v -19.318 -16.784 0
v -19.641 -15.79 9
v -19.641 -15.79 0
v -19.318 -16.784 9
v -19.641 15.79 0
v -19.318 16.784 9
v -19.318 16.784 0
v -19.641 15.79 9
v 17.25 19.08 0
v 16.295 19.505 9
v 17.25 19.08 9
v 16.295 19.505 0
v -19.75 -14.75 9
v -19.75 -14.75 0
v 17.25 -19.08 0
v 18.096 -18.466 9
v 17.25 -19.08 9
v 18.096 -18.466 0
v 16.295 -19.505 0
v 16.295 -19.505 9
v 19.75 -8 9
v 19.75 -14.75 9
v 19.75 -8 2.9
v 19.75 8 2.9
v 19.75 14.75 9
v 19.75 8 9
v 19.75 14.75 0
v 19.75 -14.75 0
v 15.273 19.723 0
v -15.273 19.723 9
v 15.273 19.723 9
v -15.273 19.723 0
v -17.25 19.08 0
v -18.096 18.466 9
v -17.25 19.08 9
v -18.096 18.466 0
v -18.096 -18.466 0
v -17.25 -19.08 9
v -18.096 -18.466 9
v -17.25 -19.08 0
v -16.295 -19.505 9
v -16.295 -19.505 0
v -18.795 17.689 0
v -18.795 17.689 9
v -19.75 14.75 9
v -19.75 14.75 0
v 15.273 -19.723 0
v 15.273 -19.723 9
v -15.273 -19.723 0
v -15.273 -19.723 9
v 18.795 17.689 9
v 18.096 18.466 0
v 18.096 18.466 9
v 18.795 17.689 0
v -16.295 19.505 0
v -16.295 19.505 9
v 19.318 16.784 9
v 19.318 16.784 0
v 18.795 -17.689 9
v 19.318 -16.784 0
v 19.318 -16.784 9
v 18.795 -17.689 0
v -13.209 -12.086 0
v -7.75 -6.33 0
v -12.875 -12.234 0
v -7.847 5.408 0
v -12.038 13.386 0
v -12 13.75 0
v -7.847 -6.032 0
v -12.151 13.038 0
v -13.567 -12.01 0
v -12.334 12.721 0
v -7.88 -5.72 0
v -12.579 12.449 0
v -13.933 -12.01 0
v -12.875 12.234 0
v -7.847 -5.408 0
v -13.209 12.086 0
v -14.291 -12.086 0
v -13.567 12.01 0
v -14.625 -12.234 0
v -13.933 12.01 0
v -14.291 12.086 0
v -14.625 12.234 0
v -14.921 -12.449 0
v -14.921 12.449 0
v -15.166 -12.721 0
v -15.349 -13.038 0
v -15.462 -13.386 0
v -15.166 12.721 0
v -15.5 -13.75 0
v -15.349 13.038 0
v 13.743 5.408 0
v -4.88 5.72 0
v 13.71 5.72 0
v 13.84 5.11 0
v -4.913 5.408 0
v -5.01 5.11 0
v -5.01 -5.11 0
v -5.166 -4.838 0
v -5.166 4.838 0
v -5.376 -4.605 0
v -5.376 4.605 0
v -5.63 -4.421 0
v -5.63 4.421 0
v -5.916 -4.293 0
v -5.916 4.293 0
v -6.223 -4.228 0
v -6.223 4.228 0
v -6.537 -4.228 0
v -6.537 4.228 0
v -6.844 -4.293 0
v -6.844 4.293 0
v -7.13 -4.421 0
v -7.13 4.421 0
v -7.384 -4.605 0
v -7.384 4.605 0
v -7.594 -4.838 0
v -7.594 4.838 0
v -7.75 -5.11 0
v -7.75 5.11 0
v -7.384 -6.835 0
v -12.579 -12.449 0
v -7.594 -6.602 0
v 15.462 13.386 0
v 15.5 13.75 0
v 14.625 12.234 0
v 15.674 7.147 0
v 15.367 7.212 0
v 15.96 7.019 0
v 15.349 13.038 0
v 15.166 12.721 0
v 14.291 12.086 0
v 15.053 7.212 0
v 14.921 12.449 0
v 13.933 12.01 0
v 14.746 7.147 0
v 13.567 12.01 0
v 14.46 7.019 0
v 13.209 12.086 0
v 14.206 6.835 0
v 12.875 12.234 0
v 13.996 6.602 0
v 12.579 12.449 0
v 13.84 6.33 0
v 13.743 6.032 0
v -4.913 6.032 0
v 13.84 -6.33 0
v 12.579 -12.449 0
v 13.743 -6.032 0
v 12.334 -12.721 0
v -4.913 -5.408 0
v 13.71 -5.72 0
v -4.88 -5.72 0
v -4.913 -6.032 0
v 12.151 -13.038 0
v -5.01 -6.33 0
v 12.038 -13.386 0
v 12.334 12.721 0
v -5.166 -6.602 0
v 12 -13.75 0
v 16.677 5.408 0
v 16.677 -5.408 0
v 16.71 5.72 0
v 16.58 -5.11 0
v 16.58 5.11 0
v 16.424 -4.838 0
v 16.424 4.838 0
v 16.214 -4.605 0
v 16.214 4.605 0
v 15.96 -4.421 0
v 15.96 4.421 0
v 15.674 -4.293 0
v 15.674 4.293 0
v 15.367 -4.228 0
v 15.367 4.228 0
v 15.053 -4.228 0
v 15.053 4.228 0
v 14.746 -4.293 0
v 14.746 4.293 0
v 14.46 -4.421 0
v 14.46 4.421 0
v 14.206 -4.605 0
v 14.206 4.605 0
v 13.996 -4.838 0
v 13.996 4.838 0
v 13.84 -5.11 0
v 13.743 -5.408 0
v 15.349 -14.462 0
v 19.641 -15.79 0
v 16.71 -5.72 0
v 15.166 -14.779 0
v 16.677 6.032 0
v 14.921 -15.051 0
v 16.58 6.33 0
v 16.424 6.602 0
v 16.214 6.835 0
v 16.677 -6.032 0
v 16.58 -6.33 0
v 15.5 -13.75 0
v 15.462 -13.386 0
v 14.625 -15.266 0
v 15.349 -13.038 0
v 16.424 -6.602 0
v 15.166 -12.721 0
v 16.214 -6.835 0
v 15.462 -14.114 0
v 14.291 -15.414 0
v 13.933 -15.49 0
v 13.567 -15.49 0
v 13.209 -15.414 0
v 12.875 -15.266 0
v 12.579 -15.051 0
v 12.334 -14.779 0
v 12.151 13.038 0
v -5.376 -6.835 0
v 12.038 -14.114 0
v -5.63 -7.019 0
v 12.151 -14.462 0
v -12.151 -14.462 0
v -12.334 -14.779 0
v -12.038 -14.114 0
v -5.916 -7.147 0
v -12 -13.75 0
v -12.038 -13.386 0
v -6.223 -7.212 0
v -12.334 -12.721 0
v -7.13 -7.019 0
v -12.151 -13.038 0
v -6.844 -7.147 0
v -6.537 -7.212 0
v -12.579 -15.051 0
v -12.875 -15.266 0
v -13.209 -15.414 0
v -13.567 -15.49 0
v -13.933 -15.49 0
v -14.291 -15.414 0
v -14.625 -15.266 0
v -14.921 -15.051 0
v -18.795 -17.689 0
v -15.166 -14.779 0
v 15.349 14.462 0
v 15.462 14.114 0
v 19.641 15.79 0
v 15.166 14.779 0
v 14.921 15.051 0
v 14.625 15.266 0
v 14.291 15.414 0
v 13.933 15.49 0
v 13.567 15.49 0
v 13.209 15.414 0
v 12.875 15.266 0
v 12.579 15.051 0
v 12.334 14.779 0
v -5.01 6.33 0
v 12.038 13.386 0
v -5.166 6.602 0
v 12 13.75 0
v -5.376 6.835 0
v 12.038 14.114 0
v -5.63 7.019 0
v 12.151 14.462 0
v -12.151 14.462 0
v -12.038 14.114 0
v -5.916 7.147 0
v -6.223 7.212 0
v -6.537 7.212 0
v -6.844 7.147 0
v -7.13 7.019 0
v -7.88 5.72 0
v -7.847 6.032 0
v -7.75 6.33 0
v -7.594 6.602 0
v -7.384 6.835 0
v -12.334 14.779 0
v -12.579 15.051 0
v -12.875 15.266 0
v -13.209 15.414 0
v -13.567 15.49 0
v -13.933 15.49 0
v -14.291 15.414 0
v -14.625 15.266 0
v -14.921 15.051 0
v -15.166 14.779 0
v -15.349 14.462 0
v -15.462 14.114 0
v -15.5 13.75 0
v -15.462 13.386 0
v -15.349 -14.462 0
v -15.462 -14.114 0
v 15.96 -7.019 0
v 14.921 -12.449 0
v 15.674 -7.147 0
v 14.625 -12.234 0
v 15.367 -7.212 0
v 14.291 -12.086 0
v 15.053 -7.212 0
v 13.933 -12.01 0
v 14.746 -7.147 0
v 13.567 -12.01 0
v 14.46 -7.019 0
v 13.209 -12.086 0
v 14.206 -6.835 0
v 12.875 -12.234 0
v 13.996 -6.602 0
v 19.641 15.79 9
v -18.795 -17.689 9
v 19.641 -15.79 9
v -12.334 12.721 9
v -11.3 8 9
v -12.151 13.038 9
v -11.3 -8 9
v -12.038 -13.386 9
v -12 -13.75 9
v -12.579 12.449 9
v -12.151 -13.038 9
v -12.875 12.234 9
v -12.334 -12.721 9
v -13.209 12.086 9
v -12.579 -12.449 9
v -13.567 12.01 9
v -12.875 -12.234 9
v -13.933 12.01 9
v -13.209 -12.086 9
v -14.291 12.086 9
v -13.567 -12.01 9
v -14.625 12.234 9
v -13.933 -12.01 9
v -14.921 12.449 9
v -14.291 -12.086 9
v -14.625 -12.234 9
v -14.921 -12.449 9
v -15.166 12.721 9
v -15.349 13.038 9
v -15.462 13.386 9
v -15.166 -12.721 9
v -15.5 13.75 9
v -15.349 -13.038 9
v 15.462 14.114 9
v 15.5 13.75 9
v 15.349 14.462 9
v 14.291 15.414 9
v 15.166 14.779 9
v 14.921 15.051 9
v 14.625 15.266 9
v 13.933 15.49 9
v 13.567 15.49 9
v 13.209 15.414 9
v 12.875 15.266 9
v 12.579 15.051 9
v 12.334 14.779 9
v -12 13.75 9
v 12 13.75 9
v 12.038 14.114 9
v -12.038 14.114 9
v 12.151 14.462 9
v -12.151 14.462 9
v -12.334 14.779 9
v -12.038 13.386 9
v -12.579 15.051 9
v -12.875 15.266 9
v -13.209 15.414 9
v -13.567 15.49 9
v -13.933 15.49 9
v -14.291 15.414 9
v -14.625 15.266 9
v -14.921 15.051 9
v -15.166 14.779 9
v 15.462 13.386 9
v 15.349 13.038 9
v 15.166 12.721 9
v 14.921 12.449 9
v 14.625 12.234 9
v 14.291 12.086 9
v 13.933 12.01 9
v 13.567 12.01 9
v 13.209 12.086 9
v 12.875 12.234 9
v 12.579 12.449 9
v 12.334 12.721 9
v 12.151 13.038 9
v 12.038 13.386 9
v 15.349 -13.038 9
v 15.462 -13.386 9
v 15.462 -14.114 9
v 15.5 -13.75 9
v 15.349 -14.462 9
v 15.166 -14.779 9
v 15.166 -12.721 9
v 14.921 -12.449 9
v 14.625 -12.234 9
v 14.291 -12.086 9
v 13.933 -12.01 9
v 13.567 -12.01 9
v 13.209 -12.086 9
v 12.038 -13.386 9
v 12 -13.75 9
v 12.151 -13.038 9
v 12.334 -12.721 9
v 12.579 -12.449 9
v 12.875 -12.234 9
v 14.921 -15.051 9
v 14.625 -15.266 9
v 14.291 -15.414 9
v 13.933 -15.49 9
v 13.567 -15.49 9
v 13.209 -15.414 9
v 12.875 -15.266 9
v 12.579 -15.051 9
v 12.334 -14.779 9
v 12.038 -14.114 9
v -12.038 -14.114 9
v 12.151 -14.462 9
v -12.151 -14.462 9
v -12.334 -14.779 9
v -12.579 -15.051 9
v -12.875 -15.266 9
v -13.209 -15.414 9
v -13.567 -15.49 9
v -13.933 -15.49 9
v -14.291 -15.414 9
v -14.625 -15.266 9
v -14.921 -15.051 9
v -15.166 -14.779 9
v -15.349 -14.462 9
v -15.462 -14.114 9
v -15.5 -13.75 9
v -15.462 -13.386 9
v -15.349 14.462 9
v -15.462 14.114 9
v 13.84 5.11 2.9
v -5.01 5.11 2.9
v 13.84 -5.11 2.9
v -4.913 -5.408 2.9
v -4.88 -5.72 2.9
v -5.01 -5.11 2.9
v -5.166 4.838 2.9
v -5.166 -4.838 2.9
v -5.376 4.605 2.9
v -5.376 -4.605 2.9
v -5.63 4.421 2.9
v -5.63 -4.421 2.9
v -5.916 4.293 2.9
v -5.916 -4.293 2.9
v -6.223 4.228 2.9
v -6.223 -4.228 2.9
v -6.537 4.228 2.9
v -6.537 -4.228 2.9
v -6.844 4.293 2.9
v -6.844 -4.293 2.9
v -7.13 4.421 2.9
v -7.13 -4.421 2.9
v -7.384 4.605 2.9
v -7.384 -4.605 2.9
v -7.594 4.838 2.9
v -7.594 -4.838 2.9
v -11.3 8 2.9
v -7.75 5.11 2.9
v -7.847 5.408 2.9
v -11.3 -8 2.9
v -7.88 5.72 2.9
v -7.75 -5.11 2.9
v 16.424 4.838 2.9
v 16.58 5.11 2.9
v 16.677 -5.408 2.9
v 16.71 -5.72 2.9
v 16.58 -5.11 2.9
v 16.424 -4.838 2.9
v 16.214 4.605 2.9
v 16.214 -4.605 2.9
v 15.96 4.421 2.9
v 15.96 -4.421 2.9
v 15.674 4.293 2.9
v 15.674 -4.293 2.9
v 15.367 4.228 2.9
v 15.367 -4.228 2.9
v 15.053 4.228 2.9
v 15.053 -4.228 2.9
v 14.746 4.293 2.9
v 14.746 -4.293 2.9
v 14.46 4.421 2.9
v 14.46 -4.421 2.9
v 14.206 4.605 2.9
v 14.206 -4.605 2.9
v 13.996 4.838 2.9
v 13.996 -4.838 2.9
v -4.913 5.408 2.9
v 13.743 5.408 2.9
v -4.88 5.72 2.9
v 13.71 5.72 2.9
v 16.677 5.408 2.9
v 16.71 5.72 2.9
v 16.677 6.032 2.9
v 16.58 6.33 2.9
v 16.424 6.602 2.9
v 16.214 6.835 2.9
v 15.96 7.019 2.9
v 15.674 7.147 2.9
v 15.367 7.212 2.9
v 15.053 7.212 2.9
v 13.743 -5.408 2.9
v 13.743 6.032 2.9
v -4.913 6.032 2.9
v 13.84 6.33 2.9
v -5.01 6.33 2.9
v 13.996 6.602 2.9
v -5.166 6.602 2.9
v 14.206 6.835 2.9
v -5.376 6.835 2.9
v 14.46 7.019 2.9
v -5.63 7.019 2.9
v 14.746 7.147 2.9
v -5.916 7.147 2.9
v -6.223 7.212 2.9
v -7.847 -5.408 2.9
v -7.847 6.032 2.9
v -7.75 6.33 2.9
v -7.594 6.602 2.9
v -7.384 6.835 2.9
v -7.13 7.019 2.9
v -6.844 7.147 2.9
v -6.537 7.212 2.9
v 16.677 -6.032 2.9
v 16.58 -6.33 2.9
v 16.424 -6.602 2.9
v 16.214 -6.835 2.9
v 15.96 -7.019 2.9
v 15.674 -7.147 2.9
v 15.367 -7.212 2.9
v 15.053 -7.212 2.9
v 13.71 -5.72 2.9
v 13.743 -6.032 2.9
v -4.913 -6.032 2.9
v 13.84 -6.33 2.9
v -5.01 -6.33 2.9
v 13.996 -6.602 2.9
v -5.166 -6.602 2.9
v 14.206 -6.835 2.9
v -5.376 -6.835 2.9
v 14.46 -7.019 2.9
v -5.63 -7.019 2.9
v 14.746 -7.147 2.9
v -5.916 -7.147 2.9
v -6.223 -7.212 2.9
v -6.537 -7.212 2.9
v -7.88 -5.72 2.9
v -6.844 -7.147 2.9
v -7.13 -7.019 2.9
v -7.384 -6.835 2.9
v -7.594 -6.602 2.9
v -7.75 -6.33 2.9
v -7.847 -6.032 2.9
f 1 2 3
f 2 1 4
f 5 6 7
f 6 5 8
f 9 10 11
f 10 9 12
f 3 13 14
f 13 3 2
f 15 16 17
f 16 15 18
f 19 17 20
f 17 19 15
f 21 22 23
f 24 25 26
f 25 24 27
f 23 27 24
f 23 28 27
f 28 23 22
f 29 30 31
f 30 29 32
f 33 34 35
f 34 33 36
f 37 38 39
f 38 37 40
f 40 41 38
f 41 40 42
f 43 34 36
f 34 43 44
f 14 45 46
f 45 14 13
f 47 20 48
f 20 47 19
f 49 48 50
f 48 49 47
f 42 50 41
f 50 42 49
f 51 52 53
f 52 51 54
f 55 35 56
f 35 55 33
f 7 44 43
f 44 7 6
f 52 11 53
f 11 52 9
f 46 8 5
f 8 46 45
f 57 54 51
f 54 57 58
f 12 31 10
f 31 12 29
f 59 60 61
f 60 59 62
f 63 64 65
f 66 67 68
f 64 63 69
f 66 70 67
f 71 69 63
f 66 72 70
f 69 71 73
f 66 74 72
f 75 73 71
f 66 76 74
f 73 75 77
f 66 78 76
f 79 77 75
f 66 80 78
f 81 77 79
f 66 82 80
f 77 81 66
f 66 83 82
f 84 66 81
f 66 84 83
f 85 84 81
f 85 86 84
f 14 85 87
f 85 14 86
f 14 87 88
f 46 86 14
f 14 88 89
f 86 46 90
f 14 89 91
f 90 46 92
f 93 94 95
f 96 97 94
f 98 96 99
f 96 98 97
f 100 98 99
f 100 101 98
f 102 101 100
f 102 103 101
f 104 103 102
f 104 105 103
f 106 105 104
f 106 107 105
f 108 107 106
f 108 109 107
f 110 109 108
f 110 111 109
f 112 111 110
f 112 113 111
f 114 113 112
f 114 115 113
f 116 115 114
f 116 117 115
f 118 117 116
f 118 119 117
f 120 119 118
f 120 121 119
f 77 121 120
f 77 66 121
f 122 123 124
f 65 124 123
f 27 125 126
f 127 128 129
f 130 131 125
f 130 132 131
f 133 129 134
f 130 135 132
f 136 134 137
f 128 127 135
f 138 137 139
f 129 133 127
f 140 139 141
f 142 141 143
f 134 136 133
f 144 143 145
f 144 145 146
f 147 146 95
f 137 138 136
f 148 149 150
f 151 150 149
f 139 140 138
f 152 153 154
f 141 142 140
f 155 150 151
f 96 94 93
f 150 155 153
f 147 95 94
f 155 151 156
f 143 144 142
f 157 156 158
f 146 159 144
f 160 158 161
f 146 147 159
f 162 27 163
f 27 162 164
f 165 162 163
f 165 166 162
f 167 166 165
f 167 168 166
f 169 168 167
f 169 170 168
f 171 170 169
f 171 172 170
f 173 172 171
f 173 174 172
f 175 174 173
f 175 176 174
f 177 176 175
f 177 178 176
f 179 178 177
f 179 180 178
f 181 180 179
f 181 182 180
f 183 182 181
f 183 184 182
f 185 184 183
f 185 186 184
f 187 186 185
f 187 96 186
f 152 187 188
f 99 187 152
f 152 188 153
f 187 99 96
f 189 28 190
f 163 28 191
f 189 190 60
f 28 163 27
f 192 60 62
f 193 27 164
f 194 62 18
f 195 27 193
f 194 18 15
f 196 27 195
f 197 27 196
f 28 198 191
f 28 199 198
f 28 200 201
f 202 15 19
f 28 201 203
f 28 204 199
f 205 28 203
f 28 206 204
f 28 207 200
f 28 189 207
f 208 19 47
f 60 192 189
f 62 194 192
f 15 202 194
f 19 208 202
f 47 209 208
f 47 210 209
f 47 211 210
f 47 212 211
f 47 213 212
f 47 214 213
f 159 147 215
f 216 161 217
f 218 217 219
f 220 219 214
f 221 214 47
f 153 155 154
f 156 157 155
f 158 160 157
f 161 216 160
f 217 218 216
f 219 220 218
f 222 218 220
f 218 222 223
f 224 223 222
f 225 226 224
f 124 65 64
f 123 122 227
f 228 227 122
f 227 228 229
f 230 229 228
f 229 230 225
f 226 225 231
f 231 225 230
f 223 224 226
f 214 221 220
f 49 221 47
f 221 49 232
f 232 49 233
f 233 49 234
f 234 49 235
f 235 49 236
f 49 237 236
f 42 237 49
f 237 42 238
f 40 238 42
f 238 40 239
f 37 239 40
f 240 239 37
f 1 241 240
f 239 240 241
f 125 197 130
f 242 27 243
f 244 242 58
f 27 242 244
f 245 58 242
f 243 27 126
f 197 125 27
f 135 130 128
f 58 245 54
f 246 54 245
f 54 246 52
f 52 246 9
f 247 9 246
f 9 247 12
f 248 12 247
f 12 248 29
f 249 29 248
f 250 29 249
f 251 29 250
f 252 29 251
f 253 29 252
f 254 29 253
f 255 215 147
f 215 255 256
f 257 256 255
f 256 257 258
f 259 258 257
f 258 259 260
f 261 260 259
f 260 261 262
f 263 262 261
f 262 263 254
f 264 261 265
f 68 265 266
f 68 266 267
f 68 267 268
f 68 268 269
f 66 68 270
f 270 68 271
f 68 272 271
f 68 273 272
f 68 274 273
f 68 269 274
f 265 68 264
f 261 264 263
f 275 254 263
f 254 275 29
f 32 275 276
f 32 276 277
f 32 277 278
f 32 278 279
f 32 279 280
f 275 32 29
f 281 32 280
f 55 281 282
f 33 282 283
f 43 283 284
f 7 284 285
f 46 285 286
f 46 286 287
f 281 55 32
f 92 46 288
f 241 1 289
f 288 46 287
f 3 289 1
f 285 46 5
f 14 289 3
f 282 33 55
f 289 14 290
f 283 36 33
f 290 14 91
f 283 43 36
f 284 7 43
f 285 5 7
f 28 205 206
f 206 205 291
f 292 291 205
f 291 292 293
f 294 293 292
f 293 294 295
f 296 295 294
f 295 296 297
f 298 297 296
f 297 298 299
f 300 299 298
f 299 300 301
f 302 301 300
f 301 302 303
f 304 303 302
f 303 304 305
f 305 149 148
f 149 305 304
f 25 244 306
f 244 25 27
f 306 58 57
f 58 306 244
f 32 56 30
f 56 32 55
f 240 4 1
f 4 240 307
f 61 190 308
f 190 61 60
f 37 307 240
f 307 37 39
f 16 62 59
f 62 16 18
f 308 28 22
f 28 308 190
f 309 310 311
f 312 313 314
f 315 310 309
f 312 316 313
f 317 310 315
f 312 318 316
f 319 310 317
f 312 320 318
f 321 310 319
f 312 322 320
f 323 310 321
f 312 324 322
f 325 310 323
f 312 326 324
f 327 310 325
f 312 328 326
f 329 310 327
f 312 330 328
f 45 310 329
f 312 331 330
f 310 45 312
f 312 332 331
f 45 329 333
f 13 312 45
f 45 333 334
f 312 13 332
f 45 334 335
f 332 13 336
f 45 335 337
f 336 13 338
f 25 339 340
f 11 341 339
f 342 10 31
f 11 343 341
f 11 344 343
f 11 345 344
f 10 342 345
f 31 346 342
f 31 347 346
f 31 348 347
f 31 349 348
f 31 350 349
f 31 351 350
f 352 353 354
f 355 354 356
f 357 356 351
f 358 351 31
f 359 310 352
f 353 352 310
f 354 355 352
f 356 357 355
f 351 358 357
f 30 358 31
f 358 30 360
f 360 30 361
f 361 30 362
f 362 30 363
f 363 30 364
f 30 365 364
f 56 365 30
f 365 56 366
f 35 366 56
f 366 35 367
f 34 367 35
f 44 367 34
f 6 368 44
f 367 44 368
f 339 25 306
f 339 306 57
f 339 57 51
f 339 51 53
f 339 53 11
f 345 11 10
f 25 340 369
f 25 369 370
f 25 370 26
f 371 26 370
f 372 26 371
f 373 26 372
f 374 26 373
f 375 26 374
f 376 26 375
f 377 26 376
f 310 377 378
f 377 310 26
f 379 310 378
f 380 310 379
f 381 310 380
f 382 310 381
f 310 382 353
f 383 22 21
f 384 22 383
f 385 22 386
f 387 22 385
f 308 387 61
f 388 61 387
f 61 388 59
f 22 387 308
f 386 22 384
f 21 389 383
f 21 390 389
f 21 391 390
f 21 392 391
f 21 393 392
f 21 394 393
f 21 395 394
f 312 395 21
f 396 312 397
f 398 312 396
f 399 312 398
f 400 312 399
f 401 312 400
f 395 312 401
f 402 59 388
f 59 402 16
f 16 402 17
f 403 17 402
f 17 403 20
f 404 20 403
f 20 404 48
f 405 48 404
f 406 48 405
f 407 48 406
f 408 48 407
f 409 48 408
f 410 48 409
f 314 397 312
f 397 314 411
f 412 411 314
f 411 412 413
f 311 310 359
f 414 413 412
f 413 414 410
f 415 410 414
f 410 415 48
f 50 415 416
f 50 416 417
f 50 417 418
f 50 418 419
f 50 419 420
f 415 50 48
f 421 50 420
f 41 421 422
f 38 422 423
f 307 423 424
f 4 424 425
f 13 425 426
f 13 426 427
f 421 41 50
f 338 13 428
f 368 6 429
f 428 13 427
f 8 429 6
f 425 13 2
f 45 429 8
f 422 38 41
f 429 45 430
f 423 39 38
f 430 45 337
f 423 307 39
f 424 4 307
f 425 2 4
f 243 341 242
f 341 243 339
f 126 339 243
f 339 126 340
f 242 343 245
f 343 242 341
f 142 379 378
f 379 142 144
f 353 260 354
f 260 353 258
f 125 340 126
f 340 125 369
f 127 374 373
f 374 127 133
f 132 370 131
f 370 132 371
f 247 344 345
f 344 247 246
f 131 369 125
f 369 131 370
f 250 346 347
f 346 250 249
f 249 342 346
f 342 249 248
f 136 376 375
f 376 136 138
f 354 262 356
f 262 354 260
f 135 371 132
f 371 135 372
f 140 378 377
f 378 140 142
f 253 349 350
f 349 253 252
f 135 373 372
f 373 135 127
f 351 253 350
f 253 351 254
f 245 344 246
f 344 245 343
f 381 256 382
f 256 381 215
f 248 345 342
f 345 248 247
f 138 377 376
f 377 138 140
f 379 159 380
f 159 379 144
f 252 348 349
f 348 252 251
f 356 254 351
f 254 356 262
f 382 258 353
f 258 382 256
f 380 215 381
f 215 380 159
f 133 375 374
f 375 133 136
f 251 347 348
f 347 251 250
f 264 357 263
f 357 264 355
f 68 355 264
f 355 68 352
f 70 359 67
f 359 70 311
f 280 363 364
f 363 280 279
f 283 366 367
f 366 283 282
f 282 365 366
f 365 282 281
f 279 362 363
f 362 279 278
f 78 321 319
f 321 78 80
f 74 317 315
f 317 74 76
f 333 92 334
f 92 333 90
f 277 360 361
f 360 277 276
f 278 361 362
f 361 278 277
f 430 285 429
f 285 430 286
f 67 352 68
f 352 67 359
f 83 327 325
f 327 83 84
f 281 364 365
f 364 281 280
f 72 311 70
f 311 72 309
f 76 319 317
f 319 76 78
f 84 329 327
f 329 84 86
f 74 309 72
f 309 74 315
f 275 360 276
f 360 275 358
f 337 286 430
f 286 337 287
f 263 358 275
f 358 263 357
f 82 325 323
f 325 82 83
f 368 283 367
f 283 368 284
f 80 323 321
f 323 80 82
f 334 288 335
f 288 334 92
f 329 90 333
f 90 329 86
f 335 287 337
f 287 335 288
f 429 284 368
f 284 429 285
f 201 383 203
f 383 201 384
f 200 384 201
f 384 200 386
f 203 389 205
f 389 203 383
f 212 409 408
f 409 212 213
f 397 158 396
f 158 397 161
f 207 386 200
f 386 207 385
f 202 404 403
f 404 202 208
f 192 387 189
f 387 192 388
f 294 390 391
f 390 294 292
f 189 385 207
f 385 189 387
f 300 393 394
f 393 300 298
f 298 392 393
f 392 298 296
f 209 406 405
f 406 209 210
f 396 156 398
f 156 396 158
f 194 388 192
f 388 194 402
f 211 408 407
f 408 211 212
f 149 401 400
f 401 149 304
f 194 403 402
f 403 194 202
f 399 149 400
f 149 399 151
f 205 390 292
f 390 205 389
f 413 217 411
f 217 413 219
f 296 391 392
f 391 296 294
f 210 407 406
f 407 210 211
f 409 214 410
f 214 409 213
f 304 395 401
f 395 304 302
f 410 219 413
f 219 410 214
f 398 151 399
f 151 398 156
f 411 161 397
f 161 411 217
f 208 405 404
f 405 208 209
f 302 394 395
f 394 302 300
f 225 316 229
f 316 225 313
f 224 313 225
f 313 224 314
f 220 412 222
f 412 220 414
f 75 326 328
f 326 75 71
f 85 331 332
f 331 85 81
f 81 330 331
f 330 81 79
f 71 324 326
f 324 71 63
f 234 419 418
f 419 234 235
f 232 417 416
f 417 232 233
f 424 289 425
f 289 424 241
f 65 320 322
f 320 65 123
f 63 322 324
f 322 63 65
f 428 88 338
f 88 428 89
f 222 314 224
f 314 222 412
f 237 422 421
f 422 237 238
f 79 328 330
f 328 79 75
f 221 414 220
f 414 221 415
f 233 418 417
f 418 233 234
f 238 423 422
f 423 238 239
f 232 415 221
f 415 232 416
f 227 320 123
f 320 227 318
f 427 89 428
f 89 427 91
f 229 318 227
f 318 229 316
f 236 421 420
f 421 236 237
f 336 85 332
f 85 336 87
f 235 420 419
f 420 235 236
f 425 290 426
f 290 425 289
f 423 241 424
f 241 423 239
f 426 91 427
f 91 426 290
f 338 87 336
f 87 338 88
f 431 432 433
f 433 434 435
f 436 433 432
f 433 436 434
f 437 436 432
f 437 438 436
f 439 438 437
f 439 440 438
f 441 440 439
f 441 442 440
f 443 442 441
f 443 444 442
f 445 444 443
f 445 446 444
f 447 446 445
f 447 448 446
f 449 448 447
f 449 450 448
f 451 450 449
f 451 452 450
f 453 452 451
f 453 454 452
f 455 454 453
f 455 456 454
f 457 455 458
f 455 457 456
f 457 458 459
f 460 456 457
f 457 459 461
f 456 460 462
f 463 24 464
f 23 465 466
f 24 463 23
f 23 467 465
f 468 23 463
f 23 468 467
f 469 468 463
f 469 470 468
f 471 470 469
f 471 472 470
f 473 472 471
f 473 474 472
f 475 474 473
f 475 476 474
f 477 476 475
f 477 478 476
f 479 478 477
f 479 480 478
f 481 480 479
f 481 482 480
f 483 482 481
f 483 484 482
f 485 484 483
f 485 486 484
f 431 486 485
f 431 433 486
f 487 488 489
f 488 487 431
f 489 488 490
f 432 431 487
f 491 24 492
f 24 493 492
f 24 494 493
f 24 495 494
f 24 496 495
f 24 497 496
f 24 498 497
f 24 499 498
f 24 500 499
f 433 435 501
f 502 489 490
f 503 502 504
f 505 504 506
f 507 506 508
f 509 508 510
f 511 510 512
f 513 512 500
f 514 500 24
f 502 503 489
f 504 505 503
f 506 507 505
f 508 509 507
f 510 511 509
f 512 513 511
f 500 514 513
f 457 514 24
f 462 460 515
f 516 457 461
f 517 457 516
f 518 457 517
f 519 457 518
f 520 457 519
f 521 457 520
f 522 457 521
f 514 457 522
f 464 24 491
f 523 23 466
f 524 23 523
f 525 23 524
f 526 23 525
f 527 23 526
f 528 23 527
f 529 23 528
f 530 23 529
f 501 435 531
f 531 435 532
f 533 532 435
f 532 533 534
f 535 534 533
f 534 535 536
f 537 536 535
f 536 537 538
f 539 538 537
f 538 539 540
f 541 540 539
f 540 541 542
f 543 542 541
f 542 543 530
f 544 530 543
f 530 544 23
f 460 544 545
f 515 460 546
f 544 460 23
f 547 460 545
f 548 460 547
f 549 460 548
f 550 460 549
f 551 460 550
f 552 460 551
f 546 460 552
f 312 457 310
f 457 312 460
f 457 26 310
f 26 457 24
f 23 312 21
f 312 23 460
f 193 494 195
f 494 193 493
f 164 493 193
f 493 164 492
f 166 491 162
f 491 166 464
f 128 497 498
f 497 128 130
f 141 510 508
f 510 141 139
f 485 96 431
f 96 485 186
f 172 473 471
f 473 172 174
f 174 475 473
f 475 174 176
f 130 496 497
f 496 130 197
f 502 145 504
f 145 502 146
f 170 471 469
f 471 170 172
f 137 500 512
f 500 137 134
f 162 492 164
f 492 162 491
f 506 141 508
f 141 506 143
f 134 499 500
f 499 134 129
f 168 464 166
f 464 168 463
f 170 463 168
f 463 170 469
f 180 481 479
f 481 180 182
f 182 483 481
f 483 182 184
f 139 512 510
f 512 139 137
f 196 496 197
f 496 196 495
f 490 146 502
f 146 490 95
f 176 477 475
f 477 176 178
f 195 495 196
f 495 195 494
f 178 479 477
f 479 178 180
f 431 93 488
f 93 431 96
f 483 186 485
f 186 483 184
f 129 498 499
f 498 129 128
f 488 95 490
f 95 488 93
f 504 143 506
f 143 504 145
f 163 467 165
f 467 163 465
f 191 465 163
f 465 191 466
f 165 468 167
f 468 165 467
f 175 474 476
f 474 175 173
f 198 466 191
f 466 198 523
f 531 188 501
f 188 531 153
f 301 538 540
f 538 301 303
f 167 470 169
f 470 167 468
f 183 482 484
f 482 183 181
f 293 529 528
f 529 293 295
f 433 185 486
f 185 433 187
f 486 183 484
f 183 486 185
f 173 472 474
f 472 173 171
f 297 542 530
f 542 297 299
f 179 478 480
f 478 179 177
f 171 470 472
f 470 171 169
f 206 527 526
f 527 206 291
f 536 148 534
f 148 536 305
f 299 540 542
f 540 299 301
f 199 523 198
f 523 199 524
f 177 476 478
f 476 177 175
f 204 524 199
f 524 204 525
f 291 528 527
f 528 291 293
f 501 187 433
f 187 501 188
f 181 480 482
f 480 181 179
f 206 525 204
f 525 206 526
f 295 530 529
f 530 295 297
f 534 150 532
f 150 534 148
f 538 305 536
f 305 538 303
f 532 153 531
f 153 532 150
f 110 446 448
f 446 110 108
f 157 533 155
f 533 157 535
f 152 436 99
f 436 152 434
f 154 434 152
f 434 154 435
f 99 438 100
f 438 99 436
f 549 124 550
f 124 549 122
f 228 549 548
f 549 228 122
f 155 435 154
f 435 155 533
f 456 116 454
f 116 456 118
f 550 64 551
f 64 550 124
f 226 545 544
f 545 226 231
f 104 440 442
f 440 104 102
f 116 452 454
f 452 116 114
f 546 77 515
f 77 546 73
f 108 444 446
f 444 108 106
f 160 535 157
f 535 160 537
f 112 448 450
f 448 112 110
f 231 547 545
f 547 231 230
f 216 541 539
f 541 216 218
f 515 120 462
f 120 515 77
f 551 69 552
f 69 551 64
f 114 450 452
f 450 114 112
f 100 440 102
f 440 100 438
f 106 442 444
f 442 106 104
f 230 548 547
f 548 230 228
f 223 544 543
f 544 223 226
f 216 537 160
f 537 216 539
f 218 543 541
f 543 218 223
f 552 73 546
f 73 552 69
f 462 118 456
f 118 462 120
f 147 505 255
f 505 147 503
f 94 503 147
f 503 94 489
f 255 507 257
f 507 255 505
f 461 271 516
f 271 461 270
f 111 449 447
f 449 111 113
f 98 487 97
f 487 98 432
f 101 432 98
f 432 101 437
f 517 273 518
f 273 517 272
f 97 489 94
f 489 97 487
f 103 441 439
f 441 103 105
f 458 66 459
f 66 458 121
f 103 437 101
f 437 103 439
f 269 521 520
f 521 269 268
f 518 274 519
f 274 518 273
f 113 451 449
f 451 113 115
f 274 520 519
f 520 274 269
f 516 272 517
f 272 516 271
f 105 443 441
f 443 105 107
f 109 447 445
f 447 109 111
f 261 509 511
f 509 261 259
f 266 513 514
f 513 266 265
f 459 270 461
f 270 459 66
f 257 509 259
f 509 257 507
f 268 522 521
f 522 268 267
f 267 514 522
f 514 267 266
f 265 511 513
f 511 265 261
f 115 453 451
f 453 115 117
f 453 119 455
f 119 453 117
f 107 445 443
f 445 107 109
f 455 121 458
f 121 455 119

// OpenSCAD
// cube([2,3,4]);

//linear_extrude(height = 6, center = false, convexity = 10)
//import (file = "/Users/tristan/Box/Dev/Projects/CADIdeas/OneKey/TrinketCutout2.dxf", layer = "Cuts");
$fn = 30;

module roundedRect(size, radius) {
x = size[0];
y = size[1];
z = size[2];

linear_extrude(height=z)
hull()
{
    // place 4 circles in the corners, with the given radius
    translate([(-x/2)+(radius/2), (-y/2)+(radius/2), 0])
    circle(r=radius);

    translate([(x/2)-(radius/2), (-y/2)+(radius/2), 0])
    circle(r=radius);

    translate([(-x/2)+(radius/2), (y/2)-(radius/2), 0])
    circle(r=radius);

    translate([(x/2)-(radius/2), (y/2)-(radius/2), 0])
    circle(r=radius);
}
}

size = 39.5;
plate = 6;
thinPlate = 3;
holeOffset = size/2 - 6;
holeRad = 1.75;
trinketWidth = 16;
trinketLength = 31;
corner = 5;
smallHole = 1.5;
difference() {
    // translate([0,0,plate]) cube([size,size,plate*2],center=true);
    roundedRect([size-corner,size-corner,plate+thinPlate],radius=corner);
    translate([ holeOffset, holeOffset,0]) cylinder(h=20,r=holeRad,center=true);
    translate([-holeOffset, holeOffset,0]) cylinder(h=20,r=holeRad,center=true);
    translate([ holeOffset,-holeOffset,0]) cylinder(h=20,r=holeRad,center=true);
    translate([-holeOffset,-holeOffset,0]) cylinder(h=20,r=holeRad,center=true);
    translate([(size-trinketLength)/2,0,plate/2+thinPlate]) cube([trinketLength+0.1,trinketWidth,plate+0.2],center=true);

    translate([15.21,5.72,0]) cylinder(h=20,r=smallHole,center=true);
    translate([15.21,-5.72,0]) cylinder(h=20,r=smallHole,center=true);
    translate([-6.38,-5.72,0]) cylinder(h=20,r=smallHole,center=true);
    translate([-6.38,5.72,0]) cylinder(h=20,r=smallHole,center=true);
}
